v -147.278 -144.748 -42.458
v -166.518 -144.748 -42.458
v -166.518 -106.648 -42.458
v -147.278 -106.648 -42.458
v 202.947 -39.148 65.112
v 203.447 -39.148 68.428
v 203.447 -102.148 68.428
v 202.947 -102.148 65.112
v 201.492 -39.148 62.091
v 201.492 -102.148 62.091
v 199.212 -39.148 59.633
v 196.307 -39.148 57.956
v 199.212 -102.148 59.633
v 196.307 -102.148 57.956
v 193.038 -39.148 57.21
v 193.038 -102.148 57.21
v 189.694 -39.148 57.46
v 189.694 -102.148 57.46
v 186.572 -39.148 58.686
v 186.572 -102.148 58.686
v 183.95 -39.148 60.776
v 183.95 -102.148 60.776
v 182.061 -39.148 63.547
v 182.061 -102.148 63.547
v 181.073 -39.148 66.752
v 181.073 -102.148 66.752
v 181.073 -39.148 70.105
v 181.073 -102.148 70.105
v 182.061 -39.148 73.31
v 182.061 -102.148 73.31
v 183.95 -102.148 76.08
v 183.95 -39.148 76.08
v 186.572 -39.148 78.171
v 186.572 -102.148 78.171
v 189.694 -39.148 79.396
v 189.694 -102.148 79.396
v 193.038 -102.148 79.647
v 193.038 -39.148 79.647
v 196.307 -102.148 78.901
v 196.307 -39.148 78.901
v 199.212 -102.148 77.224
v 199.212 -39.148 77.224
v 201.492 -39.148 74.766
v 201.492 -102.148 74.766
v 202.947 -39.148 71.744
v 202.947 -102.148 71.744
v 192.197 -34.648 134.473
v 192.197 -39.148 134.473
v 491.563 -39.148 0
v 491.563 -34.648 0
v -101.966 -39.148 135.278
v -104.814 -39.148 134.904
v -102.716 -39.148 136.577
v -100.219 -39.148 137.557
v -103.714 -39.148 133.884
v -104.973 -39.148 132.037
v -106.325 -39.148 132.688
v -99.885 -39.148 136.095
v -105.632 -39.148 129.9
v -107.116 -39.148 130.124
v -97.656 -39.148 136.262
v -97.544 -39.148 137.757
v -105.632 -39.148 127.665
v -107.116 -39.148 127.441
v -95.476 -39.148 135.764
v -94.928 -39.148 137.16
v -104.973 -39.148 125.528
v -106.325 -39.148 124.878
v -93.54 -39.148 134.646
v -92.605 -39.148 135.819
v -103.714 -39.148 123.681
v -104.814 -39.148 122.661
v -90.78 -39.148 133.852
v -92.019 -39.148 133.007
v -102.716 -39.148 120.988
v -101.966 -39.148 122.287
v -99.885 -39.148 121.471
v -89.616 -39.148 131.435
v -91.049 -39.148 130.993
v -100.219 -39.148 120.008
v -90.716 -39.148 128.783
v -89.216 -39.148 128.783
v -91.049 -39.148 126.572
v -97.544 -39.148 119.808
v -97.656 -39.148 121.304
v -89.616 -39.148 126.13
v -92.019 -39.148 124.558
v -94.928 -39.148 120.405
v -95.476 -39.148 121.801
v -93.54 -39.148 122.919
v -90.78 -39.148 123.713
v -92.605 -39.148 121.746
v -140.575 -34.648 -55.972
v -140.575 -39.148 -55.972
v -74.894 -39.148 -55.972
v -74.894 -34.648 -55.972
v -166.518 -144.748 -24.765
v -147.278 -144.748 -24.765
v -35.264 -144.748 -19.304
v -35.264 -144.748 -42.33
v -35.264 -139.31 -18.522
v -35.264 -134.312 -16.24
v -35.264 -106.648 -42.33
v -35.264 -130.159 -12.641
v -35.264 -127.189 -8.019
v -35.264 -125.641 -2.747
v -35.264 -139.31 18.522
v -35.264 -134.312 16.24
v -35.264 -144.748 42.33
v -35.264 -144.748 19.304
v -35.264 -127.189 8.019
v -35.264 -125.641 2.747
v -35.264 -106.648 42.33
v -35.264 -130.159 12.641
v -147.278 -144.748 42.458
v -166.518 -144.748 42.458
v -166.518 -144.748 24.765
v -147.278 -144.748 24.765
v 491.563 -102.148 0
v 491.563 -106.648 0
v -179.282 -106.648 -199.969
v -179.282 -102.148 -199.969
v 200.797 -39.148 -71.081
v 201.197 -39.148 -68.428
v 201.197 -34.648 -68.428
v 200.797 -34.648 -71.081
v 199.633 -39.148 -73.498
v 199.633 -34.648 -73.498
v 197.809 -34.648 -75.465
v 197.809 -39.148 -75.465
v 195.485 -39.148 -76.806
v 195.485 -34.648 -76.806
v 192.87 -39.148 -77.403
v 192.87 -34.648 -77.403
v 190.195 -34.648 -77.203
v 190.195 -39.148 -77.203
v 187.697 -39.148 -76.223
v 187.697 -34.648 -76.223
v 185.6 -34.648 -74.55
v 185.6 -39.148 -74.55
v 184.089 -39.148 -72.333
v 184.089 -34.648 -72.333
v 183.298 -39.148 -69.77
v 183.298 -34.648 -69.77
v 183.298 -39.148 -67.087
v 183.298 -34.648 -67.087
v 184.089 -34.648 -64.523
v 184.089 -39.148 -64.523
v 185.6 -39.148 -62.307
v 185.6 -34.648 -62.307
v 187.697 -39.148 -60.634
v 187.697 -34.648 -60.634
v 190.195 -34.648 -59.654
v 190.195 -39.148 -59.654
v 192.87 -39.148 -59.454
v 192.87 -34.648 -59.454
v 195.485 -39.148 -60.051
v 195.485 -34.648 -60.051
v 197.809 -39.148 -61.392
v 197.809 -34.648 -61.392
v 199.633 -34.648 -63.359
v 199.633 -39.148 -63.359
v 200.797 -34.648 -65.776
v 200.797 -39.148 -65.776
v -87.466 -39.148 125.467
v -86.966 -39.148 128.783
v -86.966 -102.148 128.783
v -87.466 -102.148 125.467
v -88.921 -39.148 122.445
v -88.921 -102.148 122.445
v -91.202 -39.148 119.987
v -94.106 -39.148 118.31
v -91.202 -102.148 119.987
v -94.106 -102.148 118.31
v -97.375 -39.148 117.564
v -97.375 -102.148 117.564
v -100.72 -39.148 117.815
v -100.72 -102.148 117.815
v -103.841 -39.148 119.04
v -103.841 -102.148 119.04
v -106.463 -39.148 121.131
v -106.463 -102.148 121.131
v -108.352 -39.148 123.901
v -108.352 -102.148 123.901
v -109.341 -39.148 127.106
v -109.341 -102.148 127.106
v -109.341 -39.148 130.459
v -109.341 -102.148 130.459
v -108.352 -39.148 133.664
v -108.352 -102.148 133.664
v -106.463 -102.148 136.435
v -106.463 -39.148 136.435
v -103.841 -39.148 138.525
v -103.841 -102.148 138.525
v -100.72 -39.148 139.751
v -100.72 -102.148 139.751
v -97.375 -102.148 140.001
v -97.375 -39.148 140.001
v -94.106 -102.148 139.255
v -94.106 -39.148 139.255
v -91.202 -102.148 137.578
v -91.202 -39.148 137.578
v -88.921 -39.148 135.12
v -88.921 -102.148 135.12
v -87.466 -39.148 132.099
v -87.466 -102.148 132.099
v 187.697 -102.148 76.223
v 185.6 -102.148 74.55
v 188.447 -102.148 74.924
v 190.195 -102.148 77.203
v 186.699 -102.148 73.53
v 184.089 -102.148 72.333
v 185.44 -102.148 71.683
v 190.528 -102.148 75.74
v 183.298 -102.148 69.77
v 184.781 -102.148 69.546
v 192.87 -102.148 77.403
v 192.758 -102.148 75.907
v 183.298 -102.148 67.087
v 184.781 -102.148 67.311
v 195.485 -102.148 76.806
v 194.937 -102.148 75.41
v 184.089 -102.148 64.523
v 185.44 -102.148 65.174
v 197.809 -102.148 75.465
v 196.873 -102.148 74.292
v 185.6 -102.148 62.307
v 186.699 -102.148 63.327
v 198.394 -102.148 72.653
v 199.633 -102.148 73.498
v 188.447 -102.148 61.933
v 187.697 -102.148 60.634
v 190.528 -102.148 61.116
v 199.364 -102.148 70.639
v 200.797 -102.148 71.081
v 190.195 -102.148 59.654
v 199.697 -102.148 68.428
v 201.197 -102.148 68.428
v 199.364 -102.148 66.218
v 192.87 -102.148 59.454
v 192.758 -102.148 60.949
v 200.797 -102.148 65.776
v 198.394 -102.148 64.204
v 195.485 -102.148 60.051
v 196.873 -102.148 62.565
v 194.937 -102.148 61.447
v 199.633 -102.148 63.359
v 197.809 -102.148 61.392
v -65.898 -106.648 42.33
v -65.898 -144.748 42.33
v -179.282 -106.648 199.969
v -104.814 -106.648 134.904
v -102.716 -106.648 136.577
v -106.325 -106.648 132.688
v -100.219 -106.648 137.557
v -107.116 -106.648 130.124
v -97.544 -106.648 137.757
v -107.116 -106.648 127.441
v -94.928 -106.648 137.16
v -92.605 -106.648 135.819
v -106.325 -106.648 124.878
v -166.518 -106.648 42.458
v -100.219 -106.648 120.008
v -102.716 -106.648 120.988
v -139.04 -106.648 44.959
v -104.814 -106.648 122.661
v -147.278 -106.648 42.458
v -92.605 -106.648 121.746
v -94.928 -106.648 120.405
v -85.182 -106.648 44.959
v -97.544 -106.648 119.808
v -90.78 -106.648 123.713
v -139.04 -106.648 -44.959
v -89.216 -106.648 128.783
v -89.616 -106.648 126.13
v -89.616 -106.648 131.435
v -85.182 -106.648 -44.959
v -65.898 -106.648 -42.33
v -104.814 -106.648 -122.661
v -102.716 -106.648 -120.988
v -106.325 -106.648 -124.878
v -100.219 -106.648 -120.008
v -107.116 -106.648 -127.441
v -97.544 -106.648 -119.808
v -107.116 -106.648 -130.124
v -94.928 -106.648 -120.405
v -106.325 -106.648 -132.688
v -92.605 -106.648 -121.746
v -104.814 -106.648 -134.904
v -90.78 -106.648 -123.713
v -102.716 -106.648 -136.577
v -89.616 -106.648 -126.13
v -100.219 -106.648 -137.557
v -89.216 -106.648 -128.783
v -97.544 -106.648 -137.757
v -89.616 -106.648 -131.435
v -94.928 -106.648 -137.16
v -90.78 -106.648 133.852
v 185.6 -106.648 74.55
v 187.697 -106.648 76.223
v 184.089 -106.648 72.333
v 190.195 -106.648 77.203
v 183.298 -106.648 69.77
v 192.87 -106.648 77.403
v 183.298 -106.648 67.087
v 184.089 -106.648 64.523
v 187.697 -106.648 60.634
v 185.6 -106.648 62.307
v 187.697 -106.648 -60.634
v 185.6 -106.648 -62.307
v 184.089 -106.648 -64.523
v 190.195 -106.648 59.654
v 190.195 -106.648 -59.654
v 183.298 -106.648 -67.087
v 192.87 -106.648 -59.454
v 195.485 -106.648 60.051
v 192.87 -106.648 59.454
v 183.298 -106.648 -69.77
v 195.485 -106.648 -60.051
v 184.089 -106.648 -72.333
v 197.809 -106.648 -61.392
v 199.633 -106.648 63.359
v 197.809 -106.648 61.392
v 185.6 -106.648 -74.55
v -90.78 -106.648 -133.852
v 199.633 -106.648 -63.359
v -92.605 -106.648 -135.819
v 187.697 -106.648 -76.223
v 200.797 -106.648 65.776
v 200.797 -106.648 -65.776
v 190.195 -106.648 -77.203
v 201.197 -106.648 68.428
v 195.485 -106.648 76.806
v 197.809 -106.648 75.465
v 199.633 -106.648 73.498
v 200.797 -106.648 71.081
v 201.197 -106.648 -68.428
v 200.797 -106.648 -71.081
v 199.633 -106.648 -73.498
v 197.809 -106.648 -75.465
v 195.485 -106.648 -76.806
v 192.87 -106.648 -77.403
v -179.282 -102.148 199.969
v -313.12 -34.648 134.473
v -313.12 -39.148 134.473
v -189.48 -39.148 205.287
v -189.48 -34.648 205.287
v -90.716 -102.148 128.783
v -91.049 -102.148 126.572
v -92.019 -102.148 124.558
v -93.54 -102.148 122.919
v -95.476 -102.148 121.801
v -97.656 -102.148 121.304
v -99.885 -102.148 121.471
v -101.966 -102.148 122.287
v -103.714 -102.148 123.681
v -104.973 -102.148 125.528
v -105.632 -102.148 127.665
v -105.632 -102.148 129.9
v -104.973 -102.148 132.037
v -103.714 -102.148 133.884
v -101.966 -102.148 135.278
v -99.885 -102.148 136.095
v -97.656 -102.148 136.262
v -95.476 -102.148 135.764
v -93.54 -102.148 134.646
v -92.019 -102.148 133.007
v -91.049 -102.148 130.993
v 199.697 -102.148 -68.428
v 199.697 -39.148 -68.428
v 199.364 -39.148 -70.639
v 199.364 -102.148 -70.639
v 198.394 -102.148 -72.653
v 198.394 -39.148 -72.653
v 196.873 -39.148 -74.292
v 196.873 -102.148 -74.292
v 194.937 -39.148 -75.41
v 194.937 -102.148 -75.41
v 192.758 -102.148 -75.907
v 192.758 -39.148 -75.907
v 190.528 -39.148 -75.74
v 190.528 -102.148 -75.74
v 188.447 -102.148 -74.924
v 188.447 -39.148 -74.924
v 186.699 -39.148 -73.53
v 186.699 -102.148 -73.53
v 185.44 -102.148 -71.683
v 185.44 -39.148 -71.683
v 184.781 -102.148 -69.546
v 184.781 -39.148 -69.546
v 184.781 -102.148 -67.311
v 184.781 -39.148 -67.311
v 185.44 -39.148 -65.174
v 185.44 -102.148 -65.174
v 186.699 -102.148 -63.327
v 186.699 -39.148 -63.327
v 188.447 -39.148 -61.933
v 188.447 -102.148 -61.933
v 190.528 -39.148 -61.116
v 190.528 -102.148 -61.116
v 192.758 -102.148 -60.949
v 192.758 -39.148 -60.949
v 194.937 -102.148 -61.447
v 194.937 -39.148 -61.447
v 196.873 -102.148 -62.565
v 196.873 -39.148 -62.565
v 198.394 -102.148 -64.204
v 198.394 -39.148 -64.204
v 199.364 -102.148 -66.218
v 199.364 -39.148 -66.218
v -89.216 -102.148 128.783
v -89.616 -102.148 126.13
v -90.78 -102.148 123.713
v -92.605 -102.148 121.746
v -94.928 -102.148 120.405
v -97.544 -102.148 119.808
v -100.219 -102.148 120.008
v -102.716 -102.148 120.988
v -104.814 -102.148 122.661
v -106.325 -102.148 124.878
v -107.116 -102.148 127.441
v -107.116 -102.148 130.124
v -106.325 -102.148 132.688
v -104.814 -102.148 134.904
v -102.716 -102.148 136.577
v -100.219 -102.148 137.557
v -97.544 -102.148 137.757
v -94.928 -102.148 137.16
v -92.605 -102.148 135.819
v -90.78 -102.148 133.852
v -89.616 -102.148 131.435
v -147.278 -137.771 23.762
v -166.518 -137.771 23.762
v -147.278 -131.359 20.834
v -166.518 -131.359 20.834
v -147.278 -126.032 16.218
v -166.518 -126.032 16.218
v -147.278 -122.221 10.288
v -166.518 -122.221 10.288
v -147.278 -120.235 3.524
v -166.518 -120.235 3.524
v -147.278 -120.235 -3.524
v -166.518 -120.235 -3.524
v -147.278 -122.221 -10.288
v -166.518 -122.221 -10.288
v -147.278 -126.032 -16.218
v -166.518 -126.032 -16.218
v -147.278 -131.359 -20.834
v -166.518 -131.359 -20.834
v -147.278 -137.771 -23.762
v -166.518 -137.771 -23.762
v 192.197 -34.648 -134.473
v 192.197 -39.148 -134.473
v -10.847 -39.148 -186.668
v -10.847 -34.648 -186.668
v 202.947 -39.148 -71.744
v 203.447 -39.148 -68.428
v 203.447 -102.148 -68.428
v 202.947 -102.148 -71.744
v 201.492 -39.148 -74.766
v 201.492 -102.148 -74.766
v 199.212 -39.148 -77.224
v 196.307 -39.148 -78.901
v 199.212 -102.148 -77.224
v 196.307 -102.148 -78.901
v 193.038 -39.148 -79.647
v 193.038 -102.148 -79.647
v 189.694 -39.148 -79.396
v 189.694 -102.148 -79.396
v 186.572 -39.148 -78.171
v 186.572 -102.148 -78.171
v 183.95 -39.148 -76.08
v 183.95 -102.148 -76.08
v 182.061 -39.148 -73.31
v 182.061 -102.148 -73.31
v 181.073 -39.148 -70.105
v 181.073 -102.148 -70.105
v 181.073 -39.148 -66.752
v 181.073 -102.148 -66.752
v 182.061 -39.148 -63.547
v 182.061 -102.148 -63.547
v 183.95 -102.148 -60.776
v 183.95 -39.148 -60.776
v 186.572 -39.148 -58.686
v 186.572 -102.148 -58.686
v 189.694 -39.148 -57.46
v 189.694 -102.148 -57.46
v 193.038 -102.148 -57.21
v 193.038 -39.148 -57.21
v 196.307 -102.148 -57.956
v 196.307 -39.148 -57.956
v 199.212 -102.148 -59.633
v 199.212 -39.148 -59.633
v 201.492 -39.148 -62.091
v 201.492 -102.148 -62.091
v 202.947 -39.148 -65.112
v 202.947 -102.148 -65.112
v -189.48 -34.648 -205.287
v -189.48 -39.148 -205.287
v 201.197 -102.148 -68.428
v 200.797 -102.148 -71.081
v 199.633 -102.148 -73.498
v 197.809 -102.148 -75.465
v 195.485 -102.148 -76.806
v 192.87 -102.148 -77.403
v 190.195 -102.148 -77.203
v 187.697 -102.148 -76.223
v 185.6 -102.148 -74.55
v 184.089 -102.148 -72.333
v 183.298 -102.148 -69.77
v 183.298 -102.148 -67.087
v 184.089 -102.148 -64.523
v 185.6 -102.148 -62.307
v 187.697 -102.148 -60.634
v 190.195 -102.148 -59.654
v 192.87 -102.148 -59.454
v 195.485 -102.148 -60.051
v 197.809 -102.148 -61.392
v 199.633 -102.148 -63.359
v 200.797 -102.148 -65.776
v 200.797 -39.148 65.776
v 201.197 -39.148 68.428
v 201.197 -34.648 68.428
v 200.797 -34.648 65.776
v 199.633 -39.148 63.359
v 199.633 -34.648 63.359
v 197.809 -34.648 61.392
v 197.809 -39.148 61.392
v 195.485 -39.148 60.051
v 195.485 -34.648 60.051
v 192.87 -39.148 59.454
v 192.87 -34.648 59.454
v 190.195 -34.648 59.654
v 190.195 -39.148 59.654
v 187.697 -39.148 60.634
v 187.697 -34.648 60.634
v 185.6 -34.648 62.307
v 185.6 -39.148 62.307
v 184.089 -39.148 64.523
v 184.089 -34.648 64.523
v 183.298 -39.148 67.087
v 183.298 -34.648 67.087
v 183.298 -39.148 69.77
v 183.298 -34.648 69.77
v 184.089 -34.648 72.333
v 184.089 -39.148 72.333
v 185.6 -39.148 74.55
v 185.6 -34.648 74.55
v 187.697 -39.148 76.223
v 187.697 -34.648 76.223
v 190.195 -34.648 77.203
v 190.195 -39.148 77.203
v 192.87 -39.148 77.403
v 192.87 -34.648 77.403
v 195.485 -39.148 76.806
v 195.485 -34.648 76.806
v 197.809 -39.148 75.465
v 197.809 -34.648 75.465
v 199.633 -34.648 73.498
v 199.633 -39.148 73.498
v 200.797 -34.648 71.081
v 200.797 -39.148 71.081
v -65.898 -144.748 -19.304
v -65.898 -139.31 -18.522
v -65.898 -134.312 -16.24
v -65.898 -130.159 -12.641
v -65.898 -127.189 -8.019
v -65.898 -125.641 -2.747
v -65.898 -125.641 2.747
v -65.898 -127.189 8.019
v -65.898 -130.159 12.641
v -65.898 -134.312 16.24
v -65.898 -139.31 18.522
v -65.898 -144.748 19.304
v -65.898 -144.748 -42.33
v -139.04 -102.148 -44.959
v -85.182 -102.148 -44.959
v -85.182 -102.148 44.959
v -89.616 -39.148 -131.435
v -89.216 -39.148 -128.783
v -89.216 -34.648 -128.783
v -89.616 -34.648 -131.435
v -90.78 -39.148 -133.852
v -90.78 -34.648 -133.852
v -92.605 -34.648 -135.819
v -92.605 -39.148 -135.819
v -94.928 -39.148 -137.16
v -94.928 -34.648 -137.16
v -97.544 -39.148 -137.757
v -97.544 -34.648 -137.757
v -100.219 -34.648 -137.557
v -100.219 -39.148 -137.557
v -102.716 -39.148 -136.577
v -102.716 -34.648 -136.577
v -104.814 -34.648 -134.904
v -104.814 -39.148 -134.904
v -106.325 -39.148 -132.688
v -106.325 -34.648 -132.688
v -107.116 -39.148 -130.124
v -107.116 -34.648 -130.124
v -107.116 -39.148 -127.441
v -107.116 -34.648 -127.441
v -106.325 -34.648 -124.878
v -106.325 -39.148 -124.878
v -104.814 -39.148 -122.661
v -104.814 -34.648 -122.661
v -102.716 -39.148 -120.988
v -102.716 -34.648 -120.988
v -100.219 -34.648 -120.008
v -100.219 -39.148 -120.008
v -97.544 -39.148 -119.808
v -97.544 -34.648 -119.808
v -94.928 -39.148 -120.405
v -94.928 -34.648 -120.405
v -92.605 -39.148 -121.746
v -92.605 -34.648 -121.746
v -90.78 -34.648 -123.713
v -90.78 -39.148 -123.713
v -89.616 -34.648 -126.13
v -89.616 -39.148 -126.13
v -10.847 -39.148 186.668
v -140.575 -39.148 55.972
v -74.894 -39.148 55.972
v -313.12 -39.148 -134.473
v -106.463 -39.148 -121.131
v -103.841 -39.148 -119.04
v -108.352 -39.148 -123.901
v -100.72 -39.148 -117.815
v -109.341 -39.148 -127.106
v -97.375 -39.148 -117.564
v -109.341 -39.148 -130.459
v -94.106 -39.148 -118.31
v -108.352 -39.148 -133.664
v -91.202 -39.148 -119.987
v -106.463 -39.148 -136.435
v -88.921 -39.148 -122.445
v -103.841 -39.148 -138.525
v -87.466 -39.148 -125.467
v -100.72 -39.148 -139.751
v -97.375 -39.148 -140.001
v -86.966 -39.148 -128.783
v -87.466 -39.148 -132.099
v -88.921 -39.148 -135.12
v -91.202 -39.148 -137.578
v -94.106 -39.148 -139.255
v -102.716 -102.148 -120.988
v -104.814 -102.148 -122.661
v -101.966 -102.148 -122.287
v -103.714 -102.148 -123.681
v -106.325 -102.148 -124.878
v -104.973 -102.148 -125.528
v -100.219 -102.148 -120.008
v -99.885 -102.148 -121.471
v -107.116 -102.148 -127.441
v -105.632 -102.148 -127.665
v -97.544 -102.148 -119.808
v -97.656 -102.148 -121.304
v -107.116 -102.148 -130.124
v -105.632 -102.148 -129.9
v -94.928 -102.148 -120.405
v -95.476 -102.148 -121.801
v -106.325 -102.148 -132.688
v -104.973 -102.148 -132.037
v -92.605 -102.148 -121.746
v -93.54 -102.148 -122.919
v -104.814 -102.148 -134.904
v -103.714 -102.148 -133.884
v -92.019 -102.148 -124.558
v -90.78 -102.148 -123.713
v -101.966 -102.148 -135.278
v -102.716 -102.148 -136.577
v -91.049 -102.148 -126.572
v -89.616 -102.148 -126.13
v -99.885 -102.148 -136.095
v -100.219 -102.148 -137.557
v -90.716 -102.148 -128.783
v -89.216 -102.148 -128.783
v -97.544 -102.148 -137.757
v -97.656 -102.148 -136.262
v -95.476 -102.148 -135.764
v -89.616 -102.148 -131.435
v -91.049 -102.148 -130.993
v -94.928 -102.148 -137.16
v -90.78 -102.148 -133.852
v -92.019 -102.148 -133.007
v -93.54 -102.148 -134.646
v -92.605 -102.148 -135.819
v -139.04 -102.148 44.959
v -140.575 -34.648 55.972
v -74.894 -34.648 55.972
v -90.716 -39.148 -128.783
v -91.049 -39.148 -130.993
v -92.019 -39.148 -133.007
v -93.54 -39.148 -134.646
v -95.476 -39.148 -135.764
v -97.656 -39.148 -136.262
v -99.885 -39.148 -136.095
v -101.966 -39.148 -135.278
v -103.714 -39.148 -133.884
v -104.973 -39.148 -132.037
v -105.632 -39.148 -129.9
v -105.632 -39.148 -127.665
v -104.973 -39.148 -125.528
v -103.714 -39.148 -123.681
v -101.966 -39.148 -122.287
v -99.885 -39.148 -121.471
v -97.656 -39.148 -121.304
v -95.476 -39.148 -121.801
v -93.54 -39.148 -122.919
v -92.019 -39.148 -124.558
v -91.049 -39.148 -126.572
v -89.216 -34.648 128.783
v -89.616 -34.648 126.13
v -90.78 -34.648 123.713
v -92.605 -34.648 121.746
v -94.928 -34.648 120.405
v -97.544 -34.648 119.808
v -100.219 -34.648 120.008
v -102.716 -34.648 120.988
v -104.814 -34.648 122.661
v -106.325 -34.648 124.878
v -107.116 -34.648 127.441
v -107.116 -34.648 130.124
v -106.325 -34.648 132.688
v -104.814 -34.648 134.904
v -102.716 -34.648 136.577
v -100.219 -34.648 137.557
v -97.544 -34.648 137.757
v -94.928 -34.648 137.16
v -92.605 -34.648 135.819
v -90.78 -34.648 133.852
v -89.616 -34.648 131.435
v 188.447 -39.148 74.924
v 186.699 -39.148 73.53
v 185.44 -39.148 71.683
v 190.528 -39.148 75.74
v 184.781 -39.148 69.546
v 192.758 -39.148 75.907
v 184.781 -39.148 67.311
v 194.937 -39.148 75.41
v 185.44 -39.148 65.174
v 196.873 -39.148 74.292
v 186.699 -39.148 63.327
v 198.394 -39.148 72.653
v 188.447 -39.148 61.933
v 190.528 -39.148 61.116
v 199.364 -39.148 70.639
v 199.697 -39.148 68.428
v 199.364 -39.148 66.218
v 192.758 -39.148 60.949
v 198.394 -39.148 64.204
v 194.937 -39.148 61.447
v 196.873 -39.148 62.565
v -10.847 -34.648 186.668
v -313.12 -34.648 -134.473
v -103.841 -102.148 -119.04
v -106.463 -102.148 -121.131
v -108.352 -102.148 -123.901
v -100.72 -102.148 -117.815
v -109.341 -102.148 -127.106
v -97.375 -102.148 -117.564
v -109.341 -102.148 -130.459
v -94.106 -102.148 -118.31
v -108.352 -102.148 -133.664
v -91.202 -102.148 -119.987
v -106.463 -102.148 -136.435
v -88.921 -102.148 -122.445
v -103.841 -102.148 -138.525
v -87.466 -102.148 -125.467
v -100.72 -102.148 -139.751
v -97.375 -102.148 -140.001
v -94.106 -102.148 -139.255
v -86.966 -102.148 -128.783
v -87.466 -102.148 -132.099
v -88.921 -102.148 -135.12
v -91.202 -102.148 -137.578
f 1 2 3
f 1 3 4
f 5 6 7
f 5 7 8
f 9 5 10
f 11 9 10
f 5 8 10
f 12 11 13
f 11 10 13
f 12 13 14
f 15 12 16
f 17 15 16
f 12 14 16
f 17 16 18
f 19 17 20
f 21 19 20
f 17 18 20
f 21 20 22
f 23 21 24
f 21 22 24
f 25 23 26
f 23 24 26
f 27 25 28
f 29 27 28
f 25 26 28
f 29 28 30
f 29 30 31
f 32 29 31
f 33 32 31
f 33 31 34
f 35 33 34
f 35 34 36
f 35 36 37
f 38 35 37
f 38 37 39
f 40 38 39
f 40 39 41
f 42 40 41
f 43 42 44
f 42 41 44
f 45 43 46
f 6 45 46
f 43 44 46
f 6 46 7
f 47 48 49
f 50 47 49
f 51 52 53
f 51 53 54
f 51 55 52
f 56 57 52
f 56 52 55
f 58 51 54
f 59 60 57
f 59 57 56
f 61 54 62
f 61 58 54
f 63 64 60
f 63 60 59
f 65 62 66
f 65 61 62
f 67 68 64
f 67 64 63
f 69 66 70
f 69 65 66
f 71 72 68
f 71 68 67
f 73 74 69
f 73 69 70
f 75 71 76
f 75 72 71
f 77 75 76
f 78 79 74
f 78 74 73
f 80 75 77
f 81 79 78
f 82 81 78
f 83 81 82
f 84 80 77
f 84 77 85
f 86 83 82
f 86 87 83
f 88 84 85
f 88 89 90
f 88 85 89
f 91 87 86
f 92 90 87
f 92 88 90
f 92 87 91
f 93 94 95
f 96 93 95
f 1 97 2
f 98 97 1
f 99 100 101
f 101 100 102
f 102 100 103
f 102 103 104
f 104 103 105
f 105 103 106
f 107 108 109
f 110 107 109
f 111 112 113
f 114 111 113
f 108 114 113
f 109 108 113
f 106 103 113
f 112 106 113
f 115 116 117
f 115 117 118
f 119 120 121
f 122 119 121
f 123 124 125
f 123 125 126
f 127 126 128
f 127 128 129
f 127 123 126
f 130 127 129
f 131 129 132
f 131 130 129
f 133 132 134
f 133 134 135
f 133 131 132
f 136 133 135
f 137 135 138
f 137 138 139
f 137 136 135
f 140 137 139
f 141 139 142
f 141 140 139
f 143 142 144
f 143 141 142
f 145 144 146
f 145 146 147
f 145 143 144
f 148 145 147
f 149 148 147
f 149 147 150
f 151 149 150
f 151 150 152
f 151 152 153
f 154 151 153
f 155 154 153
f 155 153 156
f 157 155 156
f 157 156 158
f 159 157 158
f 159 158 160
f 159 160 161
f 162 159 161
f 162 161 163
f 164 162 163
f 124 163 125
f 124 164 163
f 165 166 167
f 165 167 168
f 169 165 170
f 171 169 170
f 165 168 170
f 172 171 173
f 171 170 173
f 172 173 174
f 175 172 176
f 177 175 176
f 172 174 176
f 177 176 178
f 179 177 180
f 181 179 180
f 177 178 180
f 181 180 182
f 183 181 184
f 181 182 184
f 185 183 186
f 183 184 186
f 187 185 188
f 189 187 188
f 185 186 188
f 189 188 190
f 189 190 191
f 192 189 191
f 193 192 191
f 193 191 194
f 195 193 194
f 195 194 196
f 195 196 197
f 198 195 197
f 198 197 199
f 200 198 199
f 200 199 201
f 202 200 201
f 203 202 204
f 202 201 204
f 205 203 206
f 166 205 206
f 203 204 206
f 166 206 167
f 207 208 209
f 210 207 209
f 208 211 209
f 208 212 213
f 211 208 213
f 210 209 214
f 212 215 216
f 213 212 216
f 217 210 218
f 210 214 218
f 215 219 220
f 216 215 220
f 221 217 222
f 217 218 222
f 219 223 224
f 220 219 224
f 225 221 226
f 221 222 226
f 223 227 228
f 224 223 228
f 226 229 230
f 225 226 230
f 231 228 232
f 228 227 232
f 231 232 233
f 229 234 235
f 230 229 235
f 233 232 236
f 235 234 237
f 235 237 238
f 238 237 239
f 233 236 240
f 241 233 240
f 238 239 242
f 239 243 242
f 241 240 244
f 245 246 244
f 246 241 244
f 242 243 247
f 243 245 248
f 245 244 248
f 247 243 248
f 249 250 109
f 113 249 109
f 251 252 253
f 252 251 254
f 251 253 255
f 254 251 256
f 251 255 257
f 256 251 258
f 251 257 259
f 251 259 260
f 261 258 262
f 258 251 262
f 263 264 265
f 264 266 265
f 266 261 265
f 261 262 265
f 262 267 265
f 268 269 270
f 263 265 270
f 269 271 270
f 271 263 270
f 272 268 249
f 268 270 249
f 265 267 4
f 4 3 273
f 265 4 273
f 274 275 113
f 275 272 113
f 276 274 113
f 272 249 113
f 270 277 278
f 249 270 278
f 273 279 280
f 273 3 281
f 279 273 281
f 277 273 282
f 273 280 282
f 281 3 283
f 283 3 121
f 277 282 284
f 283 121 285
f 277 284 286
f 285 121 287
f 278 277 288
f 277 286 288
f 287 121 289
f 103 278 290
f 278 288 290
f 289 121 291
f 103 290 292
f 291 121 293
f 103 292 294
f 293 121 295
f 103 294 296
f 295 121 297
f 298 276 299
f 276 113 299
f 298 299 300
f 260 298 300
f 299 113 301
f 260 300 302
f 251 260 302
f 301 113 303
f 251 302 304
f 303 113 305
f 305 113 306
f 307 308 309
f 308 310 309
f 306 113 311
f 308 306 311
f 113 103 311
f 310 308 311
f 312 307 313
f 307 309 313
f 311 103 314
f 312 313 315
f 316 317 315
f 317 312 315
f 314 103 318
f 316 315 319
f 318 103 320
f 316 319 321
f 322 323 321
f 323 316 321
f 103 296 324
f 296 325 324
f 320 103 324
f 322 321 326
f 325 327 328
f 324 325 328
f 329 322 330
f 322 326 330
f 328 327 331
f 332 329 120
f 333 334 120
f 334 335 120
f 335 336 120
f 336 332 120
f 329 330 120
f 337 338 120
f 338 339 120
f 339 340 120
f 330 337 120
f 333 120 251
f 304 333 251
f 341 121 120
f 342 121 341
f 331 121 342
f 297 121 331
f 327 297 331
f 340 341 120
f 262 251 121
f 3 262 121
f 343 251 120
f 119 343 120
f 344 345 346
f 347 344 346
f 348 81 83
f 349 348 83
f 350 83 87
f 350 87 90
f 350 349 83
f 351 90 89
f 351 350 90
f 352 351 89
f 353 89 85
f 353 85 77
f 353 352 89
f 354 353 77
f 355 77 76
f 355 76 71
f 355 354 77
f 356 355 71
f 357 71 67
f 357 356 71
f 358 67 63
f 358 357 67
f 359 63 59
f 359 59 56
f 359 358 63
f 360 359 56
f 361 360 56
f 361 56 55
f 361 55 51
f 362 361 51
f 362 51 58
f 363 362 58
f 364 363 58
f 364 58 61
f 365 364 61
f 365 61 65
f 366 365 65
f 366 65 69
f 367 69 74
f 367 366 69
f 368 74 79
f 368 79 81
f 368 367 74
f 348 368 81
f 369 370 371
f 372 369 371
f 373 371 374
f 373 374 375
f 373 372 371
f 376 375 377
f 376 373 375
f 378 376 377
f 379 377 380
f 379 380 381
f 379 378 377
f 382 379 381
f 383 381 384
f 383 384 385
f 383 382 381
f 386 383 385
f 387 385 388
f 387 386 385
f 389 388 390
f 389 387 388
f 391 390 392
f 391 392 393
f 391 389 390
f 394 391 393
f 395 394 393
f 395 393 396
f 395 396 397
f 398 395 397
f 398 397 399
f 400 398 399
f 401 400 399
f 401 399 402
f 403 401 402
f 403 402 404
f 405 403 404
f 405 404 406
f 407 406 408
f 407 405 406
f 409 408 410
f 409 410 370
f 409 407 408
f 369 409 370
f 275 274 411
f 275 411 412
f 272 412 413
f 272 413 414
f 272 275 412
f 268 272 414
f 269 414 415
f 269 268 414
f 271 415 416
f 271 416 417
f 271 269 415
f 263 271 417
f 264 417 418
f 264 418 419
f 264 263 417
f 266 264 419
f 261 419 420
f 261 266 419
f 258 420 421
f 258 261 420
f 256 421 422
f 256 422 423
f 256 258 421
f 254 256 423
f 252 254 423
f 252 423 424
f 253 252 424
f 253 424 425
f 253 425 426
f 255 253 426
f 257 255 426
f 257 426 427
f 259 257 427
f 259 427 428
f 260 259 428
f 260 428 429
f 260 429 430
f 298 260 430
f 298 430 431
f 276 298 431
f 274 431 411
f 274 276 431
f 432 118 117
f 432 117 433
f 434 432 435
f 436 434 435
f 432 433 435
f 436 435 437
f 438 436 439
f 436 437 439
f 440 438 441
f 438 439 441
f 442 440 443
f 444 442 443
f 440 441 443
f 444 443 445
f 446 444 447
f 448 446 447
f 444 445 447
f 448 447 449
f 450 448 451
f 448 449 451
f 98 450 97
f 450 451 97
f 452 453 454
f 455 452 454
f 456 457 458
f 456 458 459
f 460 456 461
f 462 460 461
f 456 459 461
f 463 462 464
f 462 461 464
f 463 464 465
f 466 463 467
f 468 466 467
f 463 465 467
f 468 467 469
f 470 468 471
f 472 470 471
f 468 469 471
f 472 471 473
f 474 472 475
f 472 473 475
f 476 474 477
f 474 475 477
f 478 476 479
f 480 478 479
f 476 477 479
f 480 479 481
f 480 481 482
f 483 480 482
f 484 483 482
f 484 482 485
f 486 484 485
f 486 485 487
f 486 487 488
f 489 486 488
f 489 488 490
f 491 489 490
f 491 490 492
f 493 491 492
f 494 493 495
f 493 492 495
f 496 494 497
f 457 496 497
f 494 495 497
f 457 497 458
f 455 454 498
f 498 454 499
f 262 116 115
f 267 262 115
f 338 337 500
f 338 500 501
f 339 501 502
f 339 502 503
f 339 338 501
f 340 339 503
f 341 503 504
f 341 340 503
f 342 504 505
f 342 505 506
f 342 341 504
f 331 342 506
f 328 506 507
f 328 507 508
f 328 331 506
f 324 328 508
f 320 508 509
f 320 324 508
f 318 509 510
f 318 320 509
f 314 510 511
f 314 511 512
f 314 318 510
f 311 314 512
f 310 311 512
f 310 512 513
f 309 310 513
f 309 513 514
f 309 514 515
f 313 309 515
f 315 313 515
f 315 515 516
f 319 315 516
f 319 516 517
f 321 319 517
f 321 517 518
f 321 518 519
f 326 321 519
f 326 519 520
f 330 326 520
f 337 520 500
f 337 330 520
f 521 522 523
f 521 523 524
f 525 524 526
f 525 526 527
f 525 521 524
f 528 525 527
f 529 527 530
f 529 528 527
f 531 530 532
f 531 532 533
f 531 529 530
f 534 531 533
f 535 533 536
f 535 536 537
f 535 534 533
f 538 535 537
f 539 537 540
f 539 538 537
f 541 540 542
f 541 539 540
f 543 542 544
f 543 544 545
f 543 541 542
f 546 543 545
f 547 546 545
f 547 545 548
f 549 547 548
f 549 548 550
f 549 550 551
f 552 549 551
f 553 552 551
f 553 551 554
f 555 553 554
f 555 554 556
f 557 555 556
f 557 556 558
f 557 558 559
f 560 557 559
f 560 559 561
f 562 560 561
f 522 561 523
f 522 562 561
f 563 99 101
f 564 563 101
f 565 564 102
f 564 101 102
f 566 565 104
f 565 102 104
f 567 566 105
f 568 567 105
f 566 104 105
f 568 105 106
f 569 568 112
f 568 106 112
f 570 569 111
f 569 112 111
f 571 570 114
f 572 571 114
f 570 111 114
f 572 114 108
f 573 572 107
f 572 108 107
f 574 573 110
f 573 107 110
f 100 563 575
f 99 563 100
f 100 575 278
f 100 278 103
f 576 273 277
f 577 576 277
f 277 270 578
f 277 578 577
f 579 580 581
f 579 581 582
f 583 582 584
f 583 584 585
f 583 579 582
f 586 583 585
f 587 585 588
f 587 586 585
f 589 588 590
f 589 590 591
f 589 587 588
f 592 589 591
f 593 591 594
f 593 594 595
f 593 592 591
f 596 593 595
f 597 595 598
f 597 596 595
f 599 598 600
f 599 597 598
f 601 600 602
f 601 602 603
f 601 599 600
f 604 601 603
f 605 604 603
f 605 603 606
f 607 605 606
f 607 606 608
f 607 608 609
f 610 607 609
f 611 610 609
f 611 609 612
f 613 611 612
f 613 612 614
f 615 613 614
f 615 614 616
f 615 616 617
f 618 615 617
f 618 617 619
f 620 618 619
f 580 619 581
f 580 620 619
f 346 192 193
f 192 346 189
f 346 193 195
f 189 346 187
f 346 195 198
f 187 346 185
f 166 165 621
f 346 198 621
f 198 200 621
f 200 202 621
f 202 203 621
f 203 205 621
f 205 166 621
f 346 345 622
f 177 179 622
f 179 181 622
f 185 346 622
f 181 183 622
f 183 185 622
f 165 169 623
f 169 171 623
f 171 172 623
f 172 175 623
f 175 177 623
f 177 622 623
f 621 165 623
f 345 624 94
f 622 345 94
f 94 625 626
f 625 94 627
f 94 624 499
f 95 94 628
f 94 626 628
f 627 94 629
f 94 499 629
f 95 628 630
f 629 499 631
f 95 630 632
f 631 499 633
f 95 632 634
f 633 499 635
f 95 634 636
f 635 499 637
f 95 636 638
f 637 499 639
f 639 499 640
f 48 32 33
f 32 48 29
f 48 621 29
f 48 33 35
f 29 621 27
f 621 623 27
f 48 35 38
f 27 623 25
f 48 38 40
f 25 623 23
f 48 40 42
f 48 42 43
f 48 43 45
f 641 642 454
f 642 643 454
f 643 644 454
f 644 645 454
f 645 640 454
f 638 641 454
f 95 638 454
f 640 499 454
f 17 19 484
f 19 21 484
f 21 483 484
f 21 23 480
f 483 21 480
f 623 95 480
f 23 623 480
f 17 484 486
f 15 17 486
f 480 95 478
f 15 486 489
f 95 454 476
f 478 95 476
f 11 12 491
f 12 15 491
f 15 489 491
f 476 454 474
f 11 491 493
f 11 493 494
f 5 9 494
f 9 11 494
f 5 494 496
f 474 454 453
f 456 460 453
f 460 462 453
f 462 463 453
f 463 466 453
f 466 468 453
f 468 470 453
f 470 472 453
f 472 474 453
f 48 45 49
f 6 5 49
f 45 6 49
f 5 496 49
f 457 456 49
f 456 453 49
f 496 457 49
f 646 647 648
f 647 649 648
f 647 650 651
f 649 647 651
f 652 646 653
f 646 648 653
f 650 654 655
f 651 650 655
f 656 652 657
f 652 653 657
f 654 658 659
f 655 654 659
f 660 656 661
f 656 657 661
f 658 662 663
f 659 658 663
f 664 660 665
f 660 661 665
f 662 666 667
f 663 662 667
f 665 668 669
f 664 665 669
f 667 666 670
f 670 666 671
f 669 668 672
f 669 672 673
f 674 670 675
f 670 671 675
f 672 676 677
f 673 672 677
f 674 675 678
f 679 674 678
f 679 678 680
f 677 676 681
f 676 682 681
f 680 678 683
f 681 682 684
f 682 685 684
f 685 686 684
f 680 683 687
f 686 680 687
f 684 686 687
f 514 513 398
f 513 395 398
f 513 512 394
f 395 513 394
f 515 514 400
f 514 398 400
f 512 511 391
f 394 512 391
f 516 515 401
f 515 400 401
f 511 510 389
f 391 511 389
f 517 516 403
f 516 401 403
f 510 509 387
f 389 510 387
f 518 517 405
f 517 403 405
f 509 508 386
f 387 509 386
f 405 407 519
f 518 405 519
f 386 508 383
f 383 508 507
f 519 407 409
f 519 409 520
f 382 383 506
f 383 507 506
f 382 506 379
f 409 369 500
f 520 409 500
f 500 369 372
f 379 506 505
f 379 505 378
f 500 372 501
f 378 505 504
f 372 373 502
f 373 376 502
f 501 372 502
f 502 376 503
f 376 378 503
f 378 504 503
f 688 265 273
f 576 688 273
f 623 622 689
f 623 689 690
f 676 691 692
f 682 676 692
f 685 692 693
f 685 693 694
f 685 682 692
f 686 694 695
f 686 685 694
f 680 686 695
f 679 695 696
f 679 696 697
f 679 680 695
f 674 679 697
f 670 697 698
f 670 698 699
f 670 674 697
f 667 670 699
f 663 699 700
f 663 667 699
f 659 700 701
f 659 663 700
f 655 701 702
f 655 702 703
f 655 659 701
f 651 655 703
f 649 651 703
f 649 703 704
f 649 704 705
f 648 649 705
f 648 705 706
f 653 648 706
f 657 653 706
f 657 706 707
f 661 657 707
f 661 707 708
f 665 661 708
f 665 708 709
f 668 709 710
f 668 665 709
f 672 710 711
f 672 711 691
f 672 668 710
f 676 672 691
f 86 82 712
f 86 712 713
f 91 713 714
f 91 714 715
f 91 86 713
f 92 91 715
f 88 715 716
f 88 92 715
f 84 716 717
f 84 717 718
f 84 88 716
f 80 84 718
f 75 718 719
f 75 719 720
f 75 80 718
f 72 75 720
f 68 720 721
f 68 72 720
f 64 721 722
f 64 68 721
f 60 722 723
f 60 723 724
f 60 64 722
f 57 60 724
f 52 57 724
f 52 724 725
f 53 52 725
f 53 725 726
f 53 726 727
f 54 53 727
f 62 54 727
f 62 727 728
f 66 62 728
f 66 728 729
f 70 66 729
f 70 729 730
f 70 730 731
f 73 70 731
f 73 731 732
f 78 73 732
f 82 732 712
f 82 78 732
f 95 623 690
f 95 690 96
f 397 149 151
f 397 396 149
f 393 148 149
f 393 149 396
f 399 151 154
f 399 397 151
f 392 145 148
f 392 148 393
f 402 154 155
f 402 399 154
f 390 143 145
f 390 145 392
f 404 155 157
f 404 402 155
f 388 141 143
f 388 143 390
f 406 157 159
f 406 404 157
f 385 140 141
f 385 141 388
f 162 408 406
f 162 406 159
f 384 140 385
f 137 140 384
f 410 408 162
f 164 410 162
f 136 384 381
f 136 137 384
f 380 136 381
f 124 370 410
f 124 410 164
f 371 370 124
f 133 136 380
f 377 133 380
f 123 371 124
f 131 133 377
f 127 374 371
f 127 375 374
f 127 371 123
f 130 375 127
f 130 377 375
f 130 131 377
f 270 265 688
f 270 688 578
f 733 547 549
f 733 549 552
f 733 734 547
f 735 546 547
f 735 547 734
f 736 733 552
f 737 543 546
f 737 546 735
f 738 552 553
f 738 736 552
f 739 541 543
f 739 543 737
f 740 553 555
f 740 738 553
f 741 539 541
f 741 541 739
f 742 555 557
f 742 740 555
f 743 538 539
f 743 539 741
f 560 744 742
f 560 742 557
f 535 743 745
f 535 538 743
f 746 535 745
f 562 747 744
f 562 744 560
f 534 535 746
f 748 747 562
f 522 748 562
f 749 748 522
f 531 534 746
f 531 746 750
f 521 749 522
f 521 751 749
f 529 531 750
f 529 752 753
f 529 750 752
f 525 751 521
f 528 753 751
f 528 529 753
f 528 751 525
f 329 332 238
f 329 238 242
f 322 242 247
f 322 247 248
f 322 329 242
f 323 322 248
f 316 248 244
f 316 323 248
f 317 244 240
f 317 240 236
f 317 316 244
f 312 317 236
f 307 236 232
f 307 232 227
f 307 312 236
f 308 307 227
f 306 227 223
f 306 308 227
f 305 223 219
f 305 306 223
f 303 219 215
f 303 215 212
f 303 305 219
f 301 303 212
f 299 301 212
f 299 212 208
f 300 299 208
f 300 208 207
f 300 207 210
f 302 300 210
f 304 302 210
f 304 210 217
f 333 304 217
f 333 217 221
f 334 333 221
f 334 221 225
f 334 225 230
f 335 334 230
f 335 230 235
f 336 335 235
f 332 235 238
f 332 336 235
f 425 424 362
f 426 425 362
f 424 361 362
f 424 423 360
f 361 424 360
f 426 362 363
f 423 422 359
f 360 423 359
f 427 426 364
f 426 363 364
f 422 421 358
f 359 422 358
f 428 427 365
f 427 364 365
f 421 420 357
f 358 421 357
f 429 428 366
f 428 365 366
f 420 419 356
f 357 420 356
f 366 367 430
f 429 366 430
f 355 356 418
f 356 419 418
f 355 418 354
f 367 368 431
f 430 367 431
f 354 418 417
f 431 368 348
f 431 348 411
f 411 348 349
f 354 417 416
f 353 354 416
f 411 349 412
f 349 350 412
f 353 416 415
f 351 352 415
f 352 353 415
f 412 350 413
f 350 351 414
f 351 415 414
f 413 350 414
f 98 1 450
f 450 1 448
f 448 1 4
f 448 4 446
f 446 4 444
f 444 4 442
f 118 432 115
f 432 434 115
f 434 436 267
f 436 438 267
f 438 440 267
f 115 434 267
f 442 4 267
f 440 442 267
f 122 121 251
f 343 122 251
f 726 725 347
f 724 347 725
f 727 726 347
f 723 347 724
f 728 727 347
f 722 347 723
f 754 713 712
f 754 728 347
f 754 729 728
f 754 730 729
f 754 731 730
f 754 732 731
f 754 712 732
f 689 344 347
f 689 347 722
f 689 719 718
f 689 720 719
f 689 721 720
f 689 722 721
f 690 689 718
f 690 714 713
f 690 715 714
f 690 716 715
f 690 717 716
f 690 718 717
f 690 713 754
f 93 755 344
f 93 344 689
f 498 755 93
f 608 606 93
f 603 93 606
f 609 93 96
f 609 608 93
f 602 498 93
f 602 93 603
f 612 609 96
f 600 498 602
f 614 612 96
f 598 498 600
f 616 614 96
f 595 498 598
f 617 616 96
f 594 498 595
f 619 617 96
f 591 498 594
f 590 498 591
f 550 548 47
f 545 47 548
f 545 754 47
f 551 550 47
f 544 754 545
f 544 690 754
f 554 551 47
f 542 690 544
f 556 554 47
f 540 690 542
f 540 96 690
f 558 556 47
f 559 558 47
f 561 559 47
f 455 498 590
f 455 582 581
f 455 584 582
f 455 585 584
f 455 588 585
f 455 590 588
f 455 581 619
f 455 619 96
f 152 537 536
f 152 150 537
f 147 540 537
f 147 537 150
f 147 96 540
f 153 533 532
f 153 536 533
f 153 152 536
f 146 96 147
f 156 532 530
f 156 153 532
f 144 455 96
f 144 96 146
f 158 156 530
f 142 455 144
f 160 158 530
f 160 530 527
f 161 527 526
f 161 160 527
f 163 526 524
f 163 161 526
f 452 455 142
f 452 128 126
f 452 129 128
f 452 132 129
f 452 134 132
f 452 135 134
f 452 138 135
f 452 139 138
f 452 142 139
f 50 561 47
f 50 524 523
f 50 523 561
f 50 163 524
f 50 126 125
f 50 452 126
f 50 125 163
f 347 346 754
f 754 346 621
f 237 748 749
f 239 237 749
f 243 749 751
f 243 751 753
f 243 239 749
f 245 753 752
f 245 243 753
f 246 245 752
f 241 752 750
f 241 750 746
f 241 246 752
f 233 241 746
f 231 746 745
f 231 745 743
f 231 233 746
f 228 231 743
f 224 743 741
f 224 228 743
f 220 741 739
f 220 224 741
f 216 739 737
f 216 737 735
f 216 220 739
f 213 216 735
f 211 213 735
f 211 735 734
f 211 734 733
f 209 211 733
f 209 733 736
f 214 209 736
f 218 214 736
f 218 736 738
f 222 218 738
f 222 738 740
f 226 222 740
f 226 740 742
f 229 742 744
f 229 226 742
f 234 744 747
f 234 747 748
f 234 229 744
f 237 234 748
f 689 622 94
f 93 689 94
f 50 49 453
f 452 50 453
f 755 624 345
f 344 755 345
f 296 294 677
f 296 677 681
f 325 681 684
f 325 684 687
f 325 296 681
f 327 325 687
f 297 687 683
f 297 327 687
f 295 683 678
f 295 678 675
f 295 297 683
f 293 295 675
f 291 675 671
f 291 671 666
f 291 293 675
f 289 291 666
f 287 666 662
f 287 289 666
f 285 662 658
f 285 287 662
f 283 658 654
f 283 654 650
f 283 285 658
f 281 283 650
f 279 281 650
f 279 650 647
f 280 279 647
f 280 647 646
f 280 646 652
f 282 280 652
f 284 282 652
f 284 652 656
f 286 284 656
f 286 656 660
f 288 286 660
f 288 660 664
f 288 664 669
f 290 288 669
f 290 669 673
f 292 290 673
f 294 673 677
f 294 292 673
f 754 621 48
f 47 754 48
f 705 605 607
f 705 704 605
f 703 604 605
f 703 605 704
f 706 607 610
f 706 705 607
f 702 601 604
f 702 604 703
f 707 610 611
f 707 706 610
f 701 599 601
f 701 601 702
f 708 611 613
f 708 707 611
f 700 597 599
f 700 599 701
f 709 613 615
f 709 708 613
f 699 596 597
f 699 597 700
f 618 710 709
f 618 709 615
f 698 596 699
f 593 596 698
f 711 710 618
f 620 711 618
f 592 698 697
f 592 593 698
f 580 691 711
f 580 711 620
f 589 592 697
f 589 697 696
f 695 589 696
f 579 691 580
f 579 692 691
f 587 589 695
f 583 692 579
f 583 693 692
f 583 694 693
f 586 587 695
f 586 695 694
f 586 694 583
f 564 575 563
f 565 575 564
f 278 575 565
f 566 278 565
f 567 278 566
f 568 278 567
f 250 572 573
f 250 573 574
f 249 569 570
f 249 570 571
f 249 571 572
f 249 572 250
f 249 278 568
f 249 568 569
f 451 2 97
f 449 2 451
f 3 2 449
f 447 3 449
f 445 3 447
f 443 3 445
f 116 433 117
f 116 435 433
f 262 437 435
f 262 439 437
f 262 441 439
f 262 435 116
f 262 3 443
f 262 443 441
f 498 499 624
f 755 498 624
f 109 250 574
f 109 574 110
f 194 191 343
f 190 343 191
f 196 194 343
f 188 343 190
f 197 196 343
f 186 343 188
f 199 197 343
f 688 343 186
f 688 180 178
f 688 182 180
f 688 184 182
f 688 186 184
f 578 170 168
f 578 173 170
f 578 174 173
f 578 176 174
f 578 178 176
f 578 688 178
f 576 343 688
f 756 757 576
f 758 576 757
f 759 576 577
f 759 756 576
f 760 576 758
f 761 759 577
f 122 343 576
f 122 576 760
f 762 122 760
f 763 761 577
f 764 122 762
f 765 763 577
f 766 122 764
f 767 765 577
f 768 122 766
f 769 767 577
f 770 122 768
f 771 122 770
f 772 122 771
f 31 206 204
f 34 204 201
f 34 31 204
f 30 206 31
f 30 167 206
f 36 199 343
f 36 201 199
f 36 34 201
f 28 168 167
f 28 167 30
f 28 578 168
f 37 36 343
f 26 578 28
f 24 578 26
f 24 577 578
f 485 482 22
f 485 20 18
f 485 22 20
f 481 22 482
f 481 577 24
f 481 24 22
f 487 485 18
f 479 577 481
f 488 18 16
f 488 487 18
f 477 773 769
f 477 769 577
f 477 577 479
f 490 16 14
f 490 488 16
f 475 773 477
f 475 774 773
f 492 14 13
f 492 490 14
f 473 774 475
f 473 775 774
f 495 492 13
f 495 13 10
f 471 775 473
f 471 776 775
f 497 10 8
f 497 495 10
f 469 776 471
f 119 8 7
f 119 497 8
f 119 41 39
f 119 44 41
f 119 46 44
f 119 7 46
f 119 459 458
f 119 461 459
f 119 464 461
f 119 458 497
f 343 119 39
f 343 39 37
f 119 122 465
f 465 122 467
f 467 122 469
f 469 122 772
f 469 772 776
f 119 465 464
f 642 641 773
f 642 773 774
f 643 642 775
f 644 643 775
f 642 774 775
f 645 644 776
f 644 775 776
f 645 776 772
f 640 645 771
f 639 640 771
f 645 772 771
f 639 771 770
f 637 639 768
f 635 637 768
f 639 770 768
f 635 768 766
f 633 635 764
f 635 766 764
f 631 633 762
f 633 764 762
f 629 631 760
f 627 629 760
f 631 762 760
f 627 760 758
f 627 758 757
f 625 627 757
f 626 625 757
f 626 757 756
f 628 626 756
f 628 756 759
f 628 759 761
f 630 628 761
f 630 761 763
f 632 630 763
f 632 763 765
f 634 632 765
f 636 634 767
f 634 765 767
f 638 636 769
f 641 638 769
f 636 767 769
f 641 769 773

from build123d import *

# Parameters (mm, degrees)
STOCK_BODY2_2_1_START         = -47.04864598
STOCK_BODY2_2_1_OUTLINE_W     = 43.787012176
STOCK_BODY2_2_1_OUTLINE_H     = 74.629705784
STOCK_BODY2_2_1_OUTLINE_R     = 6
STOCK_BODY2_2_1_DEPTH         = 3
STOCK_BODY2_2_1_START_2       = -92.04864598
STOCK_BODY2_2_1_2_OUTLINE_R   = 6
STOCK_BODY2_2_1_2_OUTLINE_W   = 35.905709945
STOCK_BODY2_2_1_2_OUTLINE_H   = 59.945220798
STOCK_BODY2_2_1_2_DEPTH       = 3
STOCK_BODY2_2_1_START_3       = -89.04864598
STOCK_BODY2_2_1_3_OUTLINE_R   = 7.5
STOCK_BODY2_2_1_3_OUTLINE_R_2 = 5
STOCK_BODY2_2_1_3_DEPTH       = 42
SCALE1_SCALE                  = 1.5
SKETCH2_W                     = 19.240593306
SKETCH2_H                     = 84.91603611
BOSS_EXTRUDE1_DEPTH           = 38.1
SKETCH3_W                     = 30.633251364
SKETCH3_H                     = 84.659976372
BOSS_EXTRUDE2_DEPTH           = 38.1
SKETCH4_R                     = 19.304
CUT_EXTRUDE2_DEPTH            = 31.6738
SKETCH5_R                     = 24.765
CUT_EXTRUDE3_DEPTH            = 31.6738


# Read off the part's stored shape, not the designer's step: Stock-Body2.2-1
with BuildPart() as part:
    # Stock-Body2.2-1 outline → Stock-Body2.2-1 (new body)
    with BuildSketch(Plane(origin=(0, 0, 0), x_dir=(1, 0, 0), z_dir=(0, 1, 0)).offset(STOCK_BODY2_2_1_START)):
        Polygon((135.362738013, -89.648548647), (334.939803936, 0), (135.362738013, 89.648548647), (0, 124.445224737), (-119.088720056, 136.857824586), (-201.515305017, 89.648548647), (-201.515305017, -89.648548647), (-119.088720056, -136.857824586), (0, -124.445224737), align=None)
        with Locations((-64.591790786, 0)):
            Rectangle(STOCK_BODY2_2_1_OUTLINE_W, STOCK_BODY2_2_1_OUTLINE_H, mode=Mode.SUBTRACT)
        with Locations((-58.24622251, -85.855051723)):
            Circle(STOCK_BODY2_2_1_OUTLINE_R, mode=Mode.SUBTRACT)
        with Locations((135.362738013, -45.618949287)):
            Circle(STOCK_BODY2_2_1_OUTLINE_R, mode=Mode.SUBTRACT)
        with Locations((-58.24622251, 85.855051723)):
            Circle(STOCK_BODY2_2_1_OUTLINE_R, mode=Mode.SUBTRACT)
        with Locations((135.362738013, 45.618949287)):
            Circle(STOCK_BODY2_2_1_OUTLINE_R, mode=Mode.SUBTRACT)
    extrude(amount=STOCK_BODY2_2_1_DEPTH)



with BuildPart() as body_2:
    # Stock-Body2.2-1 2 outline → Stock-Body2.2-1 2 (new body)
    with BuildSketch(Plane(origin=(0, 0, 0), x_dir=(1, 0, 0), z_dir=(0, 1, 0)).offset(STOCK_BODY2_2_1_START_2)):
        Polygon((-112.290148162, -133.312365233), (334.939803936, 0), (-112.290148162, 133.312365233), align=None)
        with Locations((-58.24622251, -85.855051723)):
            Circle(STOCK_BODY2_2_1_2_OUTLINE_R, mode=Mode.SUBTRACT)
        with Locations((135.362738013, -45.618949287)):
            Circle(STOCK_BODY2_2_1_2_OUTLINE_R, mode=Mode.SUBTRACT)
        with Locations((-67.509316896, 0)):
            Rectangle(STOCK_BODY2_2_1_2_OUTLINE_W, STOCK_BODY2_2_1_2_OUTLINE_H, mode=Mode.SUBTRACT)
        with Locations((-58.24622251, 85.855051723)):
            Circle(STOCK_BODY2_2_1_2_OUTLINE_R, mode=Mode.SUBTRACT)
        with Locations((135.362738013, 45.618949287)):
            Circle(STOCK_BODY2_2_1_2_OUTLINE_R, mode=Mode.SUBTRACT)
    extrude(amount=STOCK_BODY2_2_1_2_DEPTH)


with BuildPart() as part_1:
    add(part.part)

    add(body_2.part)  # Stock-Body2.2-1 3 merges body 2
    # Stock-Body2.2-1 3 outline → Stock-Body2.2-1 3 (add)
    # profile 1 of 4: a face of its own
    with BuildSketch(Plane(origin=(0, 0, 0), x_dir=(1, 0, 0), z_dir=(0, 1, 0)).offset(STOCK_BODY2_2_1_START_3)):
        with Locations((135.362738013, -45.618949287)):
            Circle(STOCK_BODY2_2_1_3_OUTLINE_R)
        with Locations((135.362738013, -45.618949287)):
            Circle(STOCK_BODY2_2_1_3_OUTLINE_R_2, mode=Mode.SUBTRACT)
    # profile 2 of 4: a face of its own
    with BuildSketch(Plane(origin=(0, 0, 0), x_dir=(1, 0, 0), z_dir=(0, 1, 0)).offset(STOCK_BODY2_2_1_START_3)):
        with Locations((-58.24622251, 85.855051723)):
            Circle(STOCK_BODY2_2_1_3_OUTLINE_R)
        with Locations((-58.24622251, 85.855051723)):
            Circle(STOCK_BODY2_2_1_3_OUTLINE_R_2, mode=Mode.SUBTRACT)
    # profile 3 of 4: a face of its own
    with BuildSketch(Plane(origin=(0, 0, 0), x_dir=(1, 0, 0), z_dir=(0, 1, 0)).offset(STOCK_BODY2_2_1_START_3)):
        with Locations((135.362738013, 45.618949287)):
            Circle(STOCK_BODY2_2_1_3_OUTLINE_R)
        with Locations((135.362738013, 45.618949287)):
            Circle(STOCK_BODY2_2_1_3_OUTLINE_R_2, mode=Mode.SUBTRACT)
    # profile 4 of 4: a face of its own
    with BuildSketch(Plane(origin=(0, 0, 0), x_dir=(1, 0, 0), z_dir=(0, 1, 0)).offset(STOCK_BODY2_2_1_START_3)):
        with Locations((-58.24622251, -85.855051723)):
            Circle(STOCK_BODY2_2_1_3_OUTLINE_R)
        with Locations((-58.24622251, -85.855051723)):
            Circle(STOCK_BODY2_2_1_3_OUTLINE_R_2, mode=Mode.SUBTRACT)
    extrude(amount=STOCK_BODY2_2_1_3_DEPTH)


with BuildPart() as part_2:
    # Scale1: scaled about (21.693705028, -62.849152598, 0)
    add(part_1.part.scale(SCALE1_SCALE).moved(Location((-10.846852514, 31.424576299, 0))))

    # Sketch2 → Boss-Extrude1 (add)
    with BuildSketch(Plane.XZ.offset(106.648392671)):
        with Locations((-156.897972987, 0)):
            Rectangle(SKETCH2_W, SKETCH2_H)
    extrude(amount=BOSS_EXTRUDE1_DEPTH)

    # Sketch3 → Boss-Extrude2 (add)
    with BuildSketch(Plane.XZ.offset(106.648392671)):
        with Locations((-50.580967258, 0)):
            Rectangle(SKETCH3_W, SKETCH3_H)
    extrude(amount=BOSS_EXTRUDE2_DEPTH)

    # Sketch4 → Cut-Extrude2 (cut)
    with BuildSketch(Plane(origin=(-35.264341576, 0, 0), x_dir=(0, 0, -1), z_dir=(1, 0, 0))):
        with Locations((0, -144.748392671)):
            Circle(SKETCH4_R)
    extrude(amount=-CUT_EXTRUDE2_DEPTH, mode=Mode.SUBTRACT)

    # Sketch5 → Cut-Extrude3 (cut)
    with BuildSketch(Plane.ZY.offset(166.51826964)):
        with Locations((0, -144.748392671)):
            Circle(SKETCH5_R)
    extrude(amount=-CUT_EXTRUDE3_DEPTH, mode=Mode.SUBTRACT)


solid = part_2.part
